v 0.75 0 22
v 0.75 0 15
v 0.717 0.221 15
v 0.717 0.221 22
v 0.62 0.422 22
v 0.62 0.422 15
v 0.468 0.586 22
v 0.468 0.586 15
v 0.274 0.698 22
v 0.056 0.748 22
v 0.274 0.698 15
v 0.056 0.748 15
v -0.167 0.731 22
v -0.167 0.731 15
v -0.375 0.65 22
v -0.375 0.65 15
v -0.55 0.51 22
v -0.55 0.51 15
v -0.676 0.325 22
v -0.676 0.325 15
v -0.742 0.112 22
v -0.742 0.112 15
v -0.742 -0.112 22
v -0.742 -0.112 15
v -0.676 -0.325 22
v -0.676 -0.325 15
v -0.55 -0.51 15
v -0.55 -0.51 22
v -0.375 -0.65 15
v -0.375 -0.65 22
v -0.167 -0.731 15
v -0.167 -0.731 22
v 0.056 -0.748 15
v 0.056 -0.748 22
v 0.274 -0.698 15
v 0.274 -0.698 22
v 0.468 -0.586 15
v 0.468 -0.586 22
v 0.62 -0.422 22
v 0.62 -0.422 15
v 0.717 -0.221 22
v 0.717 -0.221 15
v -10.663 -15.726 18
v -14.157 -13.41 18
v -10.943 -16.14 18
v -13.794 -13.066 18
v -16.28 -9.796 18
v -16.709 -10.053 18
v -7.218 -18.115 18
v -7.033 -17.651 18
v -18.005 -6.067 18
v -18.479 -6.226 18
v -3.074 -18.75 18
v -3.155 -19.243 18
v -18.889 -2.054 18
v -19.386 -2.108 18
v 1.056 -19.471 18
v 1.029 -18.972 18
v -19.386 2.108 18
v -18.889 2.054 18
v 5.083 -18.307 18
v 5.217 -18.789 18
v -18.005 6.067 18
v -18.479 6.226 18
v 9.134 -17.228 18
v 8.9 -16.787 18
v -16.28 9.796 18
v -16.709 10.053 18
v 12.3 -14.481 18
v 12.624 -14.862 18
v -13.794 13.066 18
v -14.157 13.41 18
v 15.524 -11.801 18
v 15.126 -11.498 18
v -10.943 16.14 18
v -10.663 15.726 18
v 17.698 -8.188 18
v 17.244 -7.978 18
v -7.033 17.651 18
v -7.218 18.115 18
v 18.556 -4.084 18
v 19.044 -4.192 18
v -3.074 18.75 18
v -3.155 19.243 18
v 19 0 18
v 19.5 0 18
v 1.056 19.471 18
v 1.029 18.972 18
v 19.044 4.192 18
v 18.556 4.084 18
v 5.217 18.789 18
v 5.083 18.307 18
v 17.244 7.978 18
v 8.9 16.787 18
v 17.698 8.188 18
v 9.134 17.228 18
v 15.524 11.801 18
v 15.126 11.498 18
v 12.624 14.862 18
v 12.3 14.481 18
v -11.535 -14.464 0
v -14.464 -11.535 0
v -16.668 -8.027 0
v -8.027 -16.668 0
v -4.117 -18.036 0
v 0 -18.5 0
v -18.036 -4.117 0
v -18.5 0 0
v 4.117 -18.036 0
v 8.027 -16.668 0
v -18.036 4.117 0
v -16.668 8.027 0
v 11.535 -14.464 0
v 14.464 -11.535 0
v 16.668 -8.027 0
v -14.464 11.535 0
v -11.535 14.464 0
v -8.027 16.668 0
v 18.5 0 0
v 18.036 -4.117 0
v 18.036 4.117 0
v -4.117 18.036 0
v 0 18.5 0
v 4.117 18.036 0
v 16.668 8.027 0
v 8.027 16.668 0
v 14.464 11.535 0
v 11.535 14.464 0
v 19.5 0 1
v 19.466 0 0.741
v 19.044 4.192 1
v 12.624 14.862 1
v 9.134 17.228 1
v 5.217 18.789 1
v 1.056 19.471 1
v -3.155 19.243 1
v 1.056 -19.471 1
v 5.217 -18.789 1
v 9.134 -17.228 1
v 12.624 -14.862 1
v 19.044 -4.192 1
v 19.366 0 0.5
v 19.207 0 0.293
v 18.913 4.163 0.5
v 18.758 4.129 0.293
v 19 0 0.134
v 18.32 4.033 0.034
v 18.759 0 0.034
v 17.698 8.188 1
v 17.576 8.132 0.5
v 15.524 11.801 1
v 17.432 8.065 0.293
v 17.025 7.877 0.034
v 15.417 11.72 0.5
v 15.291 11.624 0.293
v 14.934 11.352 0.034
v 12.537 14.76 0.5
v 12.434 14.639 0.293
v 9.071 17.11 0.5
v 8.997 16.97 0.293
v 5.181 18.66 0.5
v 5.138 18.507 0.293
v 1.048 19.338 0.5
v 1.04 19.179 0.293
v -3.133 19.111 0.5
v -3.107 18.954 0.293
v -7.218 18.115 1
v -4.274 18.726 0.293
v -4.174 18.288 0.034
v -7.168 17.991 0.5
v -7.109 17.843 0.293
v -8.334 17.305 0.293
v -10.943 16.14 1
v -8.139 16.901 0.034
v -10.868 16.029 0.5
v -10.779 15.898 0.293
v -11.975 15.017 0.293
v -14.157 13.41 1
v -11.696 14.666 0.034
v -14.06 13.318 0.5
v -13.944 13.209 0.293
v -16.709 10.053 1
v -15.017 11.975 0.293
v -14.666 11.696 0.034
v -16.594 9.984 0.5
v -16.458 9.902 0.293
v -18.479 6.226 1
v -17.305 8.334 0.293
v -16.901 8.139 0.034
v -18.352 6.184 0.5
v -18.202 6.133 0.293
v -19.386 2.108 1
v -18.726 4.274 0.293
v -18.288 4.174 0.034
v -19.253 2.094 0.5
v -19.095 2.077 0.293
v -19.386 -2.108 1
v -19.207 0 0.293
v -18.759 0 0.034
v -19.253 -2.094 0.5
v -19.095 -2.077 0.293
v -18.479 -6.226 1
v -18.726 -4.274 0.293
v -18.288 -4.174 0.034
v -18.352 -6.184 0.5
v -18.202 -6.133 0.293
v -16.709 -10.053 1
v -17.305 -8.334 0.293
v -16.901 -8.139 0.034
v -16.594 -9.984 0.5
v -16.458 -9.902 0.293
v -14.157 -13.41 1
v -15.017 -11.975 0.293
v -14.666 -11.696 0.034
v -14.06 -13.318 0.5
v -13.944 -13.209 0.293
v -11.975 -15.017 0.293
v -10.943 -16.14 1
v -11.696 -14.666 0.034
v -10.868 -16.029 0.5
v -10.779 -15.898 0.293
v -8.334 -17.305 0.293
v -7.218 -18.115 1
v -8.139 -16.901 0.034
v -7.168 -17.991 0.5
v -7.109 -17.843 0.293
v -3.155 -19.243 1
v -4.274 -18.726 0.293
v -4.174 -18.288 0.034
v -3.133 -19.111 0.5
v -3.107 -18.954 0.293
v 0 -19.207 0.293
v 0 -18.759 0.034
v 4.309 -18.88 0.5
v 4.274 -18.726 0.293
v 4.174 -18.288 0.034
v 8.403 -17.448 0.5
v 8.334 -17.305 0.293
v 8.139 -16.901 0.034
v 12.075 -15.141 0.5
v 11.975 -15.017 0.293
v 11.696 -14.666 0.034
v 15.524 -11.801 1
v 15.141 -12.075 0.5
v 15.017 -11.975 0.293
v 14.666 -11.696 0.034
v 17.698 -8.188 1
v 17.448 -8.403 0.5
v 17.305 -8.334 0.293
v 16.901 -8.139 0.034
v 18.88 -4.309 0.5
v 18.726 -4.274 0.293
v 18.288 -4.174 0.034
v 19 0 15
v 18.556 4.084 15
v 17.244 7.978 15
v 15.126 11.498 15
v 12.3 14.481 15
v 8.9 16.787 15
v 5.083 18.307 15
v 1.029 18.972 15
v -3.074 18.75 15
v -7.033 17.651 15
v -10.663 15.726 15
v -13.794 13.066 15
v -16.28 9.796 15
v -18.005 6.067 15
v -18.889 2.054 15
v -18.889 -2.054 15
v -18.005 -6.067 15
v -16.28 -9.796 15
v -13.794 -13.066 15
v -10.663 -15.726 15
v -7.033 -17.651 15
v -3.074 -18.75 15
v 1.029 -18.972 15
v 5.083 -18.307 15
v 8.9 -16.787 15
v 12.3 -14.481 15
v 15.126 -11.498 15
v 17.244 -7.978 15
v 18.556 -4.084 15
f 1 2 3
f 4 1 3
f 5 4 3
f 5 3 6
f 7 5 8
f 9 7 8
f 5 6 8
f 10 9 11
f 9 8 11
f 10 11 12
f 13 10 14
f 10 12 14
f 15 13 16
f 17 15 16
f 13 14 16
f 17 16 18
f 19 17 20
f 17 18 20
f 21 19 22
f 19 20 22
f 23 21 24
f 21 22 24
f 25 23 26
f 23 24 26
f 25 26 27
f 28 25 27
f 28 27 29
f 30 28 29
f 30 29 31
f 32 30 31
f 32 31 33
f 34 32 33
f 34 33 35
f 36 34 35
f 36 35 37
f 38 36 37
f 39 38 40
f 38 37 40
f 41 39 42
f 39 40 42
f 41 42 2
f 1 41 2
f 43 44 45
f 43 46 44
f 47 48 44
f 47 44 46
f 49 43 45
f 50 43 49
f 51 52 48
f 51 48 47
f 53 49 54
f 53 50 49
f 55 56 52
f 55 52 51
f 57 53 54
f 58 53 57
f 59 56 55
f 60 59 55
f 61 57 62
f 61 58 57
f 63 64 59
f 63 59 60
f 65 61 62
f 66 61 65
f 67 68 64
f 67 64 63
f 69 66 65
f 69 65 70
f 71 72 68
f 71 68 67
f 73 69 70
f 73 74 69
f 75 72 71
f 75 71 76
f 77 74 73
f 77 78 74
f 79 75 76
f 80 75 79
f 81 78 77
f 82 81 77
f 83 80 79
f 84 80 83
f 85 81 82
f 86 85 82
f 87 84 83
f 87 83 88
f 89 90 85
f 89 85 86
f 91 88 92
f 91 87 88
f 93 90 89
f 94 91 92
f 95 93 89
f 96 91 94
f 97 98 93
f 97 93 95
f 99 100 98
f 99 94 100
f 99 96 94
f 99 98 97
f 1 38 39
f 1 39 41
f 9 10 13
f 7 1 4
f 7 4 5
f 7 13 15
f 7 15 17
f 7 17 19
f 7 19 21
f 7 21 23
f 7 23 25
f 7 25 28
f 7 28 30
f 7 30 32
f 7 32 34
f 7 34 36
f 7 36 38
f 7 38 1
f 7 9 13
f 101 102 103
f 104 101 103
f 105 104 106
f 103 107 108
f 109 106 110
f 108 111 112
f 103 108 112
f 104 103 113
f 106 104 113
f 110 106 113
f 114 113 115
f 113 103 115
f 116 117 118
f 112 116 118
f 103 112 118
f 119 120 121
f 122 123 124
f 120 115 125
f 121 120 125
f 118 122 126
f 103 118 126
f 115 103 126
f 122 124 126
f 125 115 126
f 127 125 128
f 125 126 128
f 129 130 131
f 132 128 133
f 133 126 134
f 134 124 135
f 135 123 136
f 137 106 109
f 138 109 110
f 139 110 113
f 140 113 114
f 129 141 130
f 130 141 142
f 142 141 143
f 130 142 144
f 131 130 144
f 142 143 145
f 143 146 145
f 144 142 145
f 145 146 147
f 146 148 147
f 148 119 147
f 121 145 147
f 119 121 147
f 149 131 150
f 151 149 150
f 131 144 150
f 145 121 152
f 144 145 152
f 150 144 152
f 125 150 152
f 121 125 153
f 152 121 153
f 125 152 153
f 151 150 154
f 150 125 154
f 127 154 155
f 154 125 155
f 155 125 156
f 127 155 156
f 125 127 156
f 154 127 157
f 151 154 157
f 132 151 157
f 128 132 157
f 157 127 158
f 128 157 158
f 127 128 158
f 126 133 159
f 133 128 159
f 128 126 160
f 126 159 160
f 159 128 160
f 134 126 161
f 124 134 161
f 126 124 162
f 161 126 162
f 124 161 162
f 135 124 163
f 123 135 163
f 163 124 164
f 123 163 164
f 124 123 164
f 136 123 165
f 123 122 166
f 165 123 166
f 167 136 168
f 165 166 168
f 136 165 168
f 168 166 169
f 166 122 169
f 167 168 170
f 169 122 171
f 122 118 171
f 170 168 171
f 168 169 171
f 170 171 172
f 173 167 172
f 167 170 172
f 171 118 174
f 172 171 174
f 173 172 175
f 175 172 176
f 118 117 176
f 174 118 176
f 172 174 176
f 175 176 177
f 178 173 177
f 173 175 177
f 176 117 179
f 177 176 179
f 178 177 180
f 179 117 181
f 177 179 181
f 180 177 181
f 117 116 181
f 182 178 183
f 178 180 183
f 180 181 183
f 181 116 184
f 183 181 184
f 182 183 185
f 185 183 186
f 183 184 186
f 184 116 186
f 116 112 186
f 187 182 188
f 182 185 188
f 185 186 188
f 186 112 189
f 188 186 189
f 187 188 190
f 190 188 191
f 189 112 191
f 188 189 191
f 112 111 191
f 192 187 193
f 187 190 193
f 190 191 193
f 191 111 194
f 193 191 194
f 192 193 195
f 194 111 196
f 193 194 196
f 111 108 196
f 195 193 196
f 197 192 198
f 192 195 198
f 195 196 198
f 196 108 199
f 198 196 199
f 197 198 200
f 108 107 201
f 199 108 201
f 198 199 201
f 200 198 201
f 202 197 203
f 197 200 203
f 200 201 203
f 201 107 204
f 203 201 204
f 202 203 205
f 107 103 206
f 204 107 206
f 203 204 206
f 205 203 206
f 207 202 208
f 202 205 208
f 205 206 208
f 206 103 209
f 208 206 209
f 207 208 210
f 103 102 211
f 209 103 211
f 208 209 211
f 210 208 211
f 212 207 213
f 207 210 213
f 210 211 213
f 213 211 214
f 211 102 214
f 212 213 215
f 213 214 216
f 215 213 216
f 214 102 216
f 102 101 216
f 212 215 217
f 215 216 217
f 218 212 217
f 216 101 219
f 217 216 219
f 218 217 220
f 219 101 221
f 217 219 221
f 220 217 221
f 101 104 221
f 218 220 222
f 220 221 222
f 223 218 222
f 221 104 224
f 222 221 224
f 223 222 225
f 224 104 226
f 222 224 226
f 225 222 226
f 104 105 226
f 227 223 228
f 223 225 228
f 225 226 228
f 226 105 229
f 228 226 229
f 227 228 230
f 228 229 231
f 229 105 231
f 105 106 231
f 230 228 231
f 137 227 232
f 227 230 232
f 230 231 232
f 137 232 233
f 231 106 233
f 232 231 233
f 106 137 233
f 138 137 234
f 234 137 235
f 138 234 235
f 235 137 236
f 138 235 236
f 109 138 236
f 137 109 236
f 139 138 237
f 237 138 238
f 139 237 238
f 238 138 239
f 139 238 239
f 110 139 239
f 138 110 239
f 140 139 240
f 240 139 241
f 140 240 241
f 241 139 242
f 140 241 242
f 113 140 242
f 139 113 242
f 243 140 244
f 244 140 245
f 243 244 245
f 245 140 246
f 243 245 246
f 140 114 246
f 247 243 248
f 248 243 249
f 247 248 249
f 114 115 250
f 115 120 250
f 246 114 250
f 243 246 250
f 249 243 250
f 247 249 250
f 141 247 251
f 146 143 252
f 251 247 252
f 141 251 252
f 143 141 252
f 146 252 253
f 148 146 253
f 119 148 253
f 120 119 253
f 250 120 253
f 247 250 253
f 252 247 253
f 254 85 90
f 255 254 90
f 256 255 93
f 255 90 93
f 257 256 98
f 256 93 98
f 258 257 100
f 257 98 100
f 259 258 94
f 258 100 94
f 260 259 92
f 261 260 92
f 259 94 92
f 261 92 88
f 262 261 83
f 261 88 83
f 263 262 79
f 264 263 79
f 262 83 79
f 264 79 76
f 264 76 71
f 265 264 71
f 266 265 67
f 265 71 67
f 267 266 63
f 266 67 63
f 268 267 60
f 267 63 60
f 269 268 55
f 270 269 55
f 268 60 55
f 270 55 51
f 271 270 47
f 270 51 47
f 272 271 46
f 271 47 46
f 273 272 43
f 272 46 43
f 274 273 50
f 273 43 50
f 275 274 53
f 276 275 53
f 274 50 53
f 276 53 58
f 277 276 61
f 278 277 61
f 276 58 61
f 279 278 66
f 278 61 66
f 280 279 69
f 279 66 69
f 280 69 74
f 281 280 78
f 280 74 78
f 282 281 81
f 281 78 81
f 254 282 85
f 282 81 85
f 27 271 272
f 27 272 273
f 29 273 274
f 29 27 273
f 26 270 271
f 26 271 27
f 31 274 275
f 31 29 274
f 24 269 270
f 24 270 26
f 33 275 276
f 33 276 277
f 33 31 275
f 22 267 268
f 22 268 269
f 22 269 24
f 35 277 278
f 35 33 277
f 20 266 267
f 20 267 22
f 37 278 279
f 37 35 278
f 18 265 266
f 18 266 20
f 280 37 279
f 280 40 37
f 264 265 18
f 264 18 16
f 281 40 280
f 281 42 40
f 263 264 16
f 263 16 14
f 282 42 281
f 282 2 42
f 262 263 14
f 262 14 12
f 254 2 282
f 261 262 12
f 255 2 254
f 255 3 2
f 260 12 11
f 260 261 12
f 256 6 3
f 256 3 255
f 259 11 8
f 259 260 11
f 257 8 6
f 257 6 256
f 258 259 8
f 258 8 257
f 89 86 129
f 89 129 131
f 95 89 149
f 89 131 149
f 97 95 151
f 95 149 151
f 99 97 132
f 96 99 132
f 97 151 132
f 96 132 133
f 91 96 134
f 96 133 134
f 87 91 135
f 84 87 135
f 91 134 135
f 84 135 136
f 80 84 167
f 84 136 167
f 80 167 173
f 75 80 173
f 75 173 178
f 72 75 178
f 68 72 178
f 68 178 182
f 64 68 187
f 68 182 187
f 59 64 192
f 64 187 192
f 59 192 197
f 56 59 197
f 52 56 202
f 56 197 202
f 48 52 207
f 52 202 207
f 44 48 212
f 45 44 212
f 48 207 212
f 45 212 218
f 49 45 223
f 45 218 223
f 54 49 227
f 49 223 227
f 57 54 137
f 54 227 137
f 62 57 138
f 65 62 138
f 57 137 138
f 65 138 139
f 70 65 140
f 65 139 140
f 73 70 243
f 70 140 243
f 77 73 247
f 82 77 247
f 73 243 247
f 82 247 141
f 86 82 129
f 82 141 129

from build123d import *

# Parameters (mm, degrees)
F0_R     = 19.5
F1_DEPTH = 18
F2_R     = 19
F3_DEPTH = 3
F4_R     = 0.75
F5_DEPTH = 7
F6_R     = 1


with BuildPart() as f1:
    # F0 (on Top) → F1 (new body)
    with BuildSketch(Plane.XY):
        Circle(F0_R)
    extrude(amount=F1_DEPTH)

    # F2 (on face) → F3 (cut)
    with BuildSketch(Plane.XY.offset(18)):
        Circle(F2_R)
    extrude(amount=-F3_DEPTH, mode=Mode.SUBTRACT)

    # F4 (on face) → F5 (join)
    with BuildSketch(Plane.XY.offset(15)):
        Circle(F4_R)
    extrude(amount=F5_DEPTH)

    # F6
    f6_edges = [f1.edges().sort_by_distance(p)[0] for p in [
        (-19.5, 0, 0),
    ]]
    fillet(f6_edges, radius=F6_R)


solid = f1.part
